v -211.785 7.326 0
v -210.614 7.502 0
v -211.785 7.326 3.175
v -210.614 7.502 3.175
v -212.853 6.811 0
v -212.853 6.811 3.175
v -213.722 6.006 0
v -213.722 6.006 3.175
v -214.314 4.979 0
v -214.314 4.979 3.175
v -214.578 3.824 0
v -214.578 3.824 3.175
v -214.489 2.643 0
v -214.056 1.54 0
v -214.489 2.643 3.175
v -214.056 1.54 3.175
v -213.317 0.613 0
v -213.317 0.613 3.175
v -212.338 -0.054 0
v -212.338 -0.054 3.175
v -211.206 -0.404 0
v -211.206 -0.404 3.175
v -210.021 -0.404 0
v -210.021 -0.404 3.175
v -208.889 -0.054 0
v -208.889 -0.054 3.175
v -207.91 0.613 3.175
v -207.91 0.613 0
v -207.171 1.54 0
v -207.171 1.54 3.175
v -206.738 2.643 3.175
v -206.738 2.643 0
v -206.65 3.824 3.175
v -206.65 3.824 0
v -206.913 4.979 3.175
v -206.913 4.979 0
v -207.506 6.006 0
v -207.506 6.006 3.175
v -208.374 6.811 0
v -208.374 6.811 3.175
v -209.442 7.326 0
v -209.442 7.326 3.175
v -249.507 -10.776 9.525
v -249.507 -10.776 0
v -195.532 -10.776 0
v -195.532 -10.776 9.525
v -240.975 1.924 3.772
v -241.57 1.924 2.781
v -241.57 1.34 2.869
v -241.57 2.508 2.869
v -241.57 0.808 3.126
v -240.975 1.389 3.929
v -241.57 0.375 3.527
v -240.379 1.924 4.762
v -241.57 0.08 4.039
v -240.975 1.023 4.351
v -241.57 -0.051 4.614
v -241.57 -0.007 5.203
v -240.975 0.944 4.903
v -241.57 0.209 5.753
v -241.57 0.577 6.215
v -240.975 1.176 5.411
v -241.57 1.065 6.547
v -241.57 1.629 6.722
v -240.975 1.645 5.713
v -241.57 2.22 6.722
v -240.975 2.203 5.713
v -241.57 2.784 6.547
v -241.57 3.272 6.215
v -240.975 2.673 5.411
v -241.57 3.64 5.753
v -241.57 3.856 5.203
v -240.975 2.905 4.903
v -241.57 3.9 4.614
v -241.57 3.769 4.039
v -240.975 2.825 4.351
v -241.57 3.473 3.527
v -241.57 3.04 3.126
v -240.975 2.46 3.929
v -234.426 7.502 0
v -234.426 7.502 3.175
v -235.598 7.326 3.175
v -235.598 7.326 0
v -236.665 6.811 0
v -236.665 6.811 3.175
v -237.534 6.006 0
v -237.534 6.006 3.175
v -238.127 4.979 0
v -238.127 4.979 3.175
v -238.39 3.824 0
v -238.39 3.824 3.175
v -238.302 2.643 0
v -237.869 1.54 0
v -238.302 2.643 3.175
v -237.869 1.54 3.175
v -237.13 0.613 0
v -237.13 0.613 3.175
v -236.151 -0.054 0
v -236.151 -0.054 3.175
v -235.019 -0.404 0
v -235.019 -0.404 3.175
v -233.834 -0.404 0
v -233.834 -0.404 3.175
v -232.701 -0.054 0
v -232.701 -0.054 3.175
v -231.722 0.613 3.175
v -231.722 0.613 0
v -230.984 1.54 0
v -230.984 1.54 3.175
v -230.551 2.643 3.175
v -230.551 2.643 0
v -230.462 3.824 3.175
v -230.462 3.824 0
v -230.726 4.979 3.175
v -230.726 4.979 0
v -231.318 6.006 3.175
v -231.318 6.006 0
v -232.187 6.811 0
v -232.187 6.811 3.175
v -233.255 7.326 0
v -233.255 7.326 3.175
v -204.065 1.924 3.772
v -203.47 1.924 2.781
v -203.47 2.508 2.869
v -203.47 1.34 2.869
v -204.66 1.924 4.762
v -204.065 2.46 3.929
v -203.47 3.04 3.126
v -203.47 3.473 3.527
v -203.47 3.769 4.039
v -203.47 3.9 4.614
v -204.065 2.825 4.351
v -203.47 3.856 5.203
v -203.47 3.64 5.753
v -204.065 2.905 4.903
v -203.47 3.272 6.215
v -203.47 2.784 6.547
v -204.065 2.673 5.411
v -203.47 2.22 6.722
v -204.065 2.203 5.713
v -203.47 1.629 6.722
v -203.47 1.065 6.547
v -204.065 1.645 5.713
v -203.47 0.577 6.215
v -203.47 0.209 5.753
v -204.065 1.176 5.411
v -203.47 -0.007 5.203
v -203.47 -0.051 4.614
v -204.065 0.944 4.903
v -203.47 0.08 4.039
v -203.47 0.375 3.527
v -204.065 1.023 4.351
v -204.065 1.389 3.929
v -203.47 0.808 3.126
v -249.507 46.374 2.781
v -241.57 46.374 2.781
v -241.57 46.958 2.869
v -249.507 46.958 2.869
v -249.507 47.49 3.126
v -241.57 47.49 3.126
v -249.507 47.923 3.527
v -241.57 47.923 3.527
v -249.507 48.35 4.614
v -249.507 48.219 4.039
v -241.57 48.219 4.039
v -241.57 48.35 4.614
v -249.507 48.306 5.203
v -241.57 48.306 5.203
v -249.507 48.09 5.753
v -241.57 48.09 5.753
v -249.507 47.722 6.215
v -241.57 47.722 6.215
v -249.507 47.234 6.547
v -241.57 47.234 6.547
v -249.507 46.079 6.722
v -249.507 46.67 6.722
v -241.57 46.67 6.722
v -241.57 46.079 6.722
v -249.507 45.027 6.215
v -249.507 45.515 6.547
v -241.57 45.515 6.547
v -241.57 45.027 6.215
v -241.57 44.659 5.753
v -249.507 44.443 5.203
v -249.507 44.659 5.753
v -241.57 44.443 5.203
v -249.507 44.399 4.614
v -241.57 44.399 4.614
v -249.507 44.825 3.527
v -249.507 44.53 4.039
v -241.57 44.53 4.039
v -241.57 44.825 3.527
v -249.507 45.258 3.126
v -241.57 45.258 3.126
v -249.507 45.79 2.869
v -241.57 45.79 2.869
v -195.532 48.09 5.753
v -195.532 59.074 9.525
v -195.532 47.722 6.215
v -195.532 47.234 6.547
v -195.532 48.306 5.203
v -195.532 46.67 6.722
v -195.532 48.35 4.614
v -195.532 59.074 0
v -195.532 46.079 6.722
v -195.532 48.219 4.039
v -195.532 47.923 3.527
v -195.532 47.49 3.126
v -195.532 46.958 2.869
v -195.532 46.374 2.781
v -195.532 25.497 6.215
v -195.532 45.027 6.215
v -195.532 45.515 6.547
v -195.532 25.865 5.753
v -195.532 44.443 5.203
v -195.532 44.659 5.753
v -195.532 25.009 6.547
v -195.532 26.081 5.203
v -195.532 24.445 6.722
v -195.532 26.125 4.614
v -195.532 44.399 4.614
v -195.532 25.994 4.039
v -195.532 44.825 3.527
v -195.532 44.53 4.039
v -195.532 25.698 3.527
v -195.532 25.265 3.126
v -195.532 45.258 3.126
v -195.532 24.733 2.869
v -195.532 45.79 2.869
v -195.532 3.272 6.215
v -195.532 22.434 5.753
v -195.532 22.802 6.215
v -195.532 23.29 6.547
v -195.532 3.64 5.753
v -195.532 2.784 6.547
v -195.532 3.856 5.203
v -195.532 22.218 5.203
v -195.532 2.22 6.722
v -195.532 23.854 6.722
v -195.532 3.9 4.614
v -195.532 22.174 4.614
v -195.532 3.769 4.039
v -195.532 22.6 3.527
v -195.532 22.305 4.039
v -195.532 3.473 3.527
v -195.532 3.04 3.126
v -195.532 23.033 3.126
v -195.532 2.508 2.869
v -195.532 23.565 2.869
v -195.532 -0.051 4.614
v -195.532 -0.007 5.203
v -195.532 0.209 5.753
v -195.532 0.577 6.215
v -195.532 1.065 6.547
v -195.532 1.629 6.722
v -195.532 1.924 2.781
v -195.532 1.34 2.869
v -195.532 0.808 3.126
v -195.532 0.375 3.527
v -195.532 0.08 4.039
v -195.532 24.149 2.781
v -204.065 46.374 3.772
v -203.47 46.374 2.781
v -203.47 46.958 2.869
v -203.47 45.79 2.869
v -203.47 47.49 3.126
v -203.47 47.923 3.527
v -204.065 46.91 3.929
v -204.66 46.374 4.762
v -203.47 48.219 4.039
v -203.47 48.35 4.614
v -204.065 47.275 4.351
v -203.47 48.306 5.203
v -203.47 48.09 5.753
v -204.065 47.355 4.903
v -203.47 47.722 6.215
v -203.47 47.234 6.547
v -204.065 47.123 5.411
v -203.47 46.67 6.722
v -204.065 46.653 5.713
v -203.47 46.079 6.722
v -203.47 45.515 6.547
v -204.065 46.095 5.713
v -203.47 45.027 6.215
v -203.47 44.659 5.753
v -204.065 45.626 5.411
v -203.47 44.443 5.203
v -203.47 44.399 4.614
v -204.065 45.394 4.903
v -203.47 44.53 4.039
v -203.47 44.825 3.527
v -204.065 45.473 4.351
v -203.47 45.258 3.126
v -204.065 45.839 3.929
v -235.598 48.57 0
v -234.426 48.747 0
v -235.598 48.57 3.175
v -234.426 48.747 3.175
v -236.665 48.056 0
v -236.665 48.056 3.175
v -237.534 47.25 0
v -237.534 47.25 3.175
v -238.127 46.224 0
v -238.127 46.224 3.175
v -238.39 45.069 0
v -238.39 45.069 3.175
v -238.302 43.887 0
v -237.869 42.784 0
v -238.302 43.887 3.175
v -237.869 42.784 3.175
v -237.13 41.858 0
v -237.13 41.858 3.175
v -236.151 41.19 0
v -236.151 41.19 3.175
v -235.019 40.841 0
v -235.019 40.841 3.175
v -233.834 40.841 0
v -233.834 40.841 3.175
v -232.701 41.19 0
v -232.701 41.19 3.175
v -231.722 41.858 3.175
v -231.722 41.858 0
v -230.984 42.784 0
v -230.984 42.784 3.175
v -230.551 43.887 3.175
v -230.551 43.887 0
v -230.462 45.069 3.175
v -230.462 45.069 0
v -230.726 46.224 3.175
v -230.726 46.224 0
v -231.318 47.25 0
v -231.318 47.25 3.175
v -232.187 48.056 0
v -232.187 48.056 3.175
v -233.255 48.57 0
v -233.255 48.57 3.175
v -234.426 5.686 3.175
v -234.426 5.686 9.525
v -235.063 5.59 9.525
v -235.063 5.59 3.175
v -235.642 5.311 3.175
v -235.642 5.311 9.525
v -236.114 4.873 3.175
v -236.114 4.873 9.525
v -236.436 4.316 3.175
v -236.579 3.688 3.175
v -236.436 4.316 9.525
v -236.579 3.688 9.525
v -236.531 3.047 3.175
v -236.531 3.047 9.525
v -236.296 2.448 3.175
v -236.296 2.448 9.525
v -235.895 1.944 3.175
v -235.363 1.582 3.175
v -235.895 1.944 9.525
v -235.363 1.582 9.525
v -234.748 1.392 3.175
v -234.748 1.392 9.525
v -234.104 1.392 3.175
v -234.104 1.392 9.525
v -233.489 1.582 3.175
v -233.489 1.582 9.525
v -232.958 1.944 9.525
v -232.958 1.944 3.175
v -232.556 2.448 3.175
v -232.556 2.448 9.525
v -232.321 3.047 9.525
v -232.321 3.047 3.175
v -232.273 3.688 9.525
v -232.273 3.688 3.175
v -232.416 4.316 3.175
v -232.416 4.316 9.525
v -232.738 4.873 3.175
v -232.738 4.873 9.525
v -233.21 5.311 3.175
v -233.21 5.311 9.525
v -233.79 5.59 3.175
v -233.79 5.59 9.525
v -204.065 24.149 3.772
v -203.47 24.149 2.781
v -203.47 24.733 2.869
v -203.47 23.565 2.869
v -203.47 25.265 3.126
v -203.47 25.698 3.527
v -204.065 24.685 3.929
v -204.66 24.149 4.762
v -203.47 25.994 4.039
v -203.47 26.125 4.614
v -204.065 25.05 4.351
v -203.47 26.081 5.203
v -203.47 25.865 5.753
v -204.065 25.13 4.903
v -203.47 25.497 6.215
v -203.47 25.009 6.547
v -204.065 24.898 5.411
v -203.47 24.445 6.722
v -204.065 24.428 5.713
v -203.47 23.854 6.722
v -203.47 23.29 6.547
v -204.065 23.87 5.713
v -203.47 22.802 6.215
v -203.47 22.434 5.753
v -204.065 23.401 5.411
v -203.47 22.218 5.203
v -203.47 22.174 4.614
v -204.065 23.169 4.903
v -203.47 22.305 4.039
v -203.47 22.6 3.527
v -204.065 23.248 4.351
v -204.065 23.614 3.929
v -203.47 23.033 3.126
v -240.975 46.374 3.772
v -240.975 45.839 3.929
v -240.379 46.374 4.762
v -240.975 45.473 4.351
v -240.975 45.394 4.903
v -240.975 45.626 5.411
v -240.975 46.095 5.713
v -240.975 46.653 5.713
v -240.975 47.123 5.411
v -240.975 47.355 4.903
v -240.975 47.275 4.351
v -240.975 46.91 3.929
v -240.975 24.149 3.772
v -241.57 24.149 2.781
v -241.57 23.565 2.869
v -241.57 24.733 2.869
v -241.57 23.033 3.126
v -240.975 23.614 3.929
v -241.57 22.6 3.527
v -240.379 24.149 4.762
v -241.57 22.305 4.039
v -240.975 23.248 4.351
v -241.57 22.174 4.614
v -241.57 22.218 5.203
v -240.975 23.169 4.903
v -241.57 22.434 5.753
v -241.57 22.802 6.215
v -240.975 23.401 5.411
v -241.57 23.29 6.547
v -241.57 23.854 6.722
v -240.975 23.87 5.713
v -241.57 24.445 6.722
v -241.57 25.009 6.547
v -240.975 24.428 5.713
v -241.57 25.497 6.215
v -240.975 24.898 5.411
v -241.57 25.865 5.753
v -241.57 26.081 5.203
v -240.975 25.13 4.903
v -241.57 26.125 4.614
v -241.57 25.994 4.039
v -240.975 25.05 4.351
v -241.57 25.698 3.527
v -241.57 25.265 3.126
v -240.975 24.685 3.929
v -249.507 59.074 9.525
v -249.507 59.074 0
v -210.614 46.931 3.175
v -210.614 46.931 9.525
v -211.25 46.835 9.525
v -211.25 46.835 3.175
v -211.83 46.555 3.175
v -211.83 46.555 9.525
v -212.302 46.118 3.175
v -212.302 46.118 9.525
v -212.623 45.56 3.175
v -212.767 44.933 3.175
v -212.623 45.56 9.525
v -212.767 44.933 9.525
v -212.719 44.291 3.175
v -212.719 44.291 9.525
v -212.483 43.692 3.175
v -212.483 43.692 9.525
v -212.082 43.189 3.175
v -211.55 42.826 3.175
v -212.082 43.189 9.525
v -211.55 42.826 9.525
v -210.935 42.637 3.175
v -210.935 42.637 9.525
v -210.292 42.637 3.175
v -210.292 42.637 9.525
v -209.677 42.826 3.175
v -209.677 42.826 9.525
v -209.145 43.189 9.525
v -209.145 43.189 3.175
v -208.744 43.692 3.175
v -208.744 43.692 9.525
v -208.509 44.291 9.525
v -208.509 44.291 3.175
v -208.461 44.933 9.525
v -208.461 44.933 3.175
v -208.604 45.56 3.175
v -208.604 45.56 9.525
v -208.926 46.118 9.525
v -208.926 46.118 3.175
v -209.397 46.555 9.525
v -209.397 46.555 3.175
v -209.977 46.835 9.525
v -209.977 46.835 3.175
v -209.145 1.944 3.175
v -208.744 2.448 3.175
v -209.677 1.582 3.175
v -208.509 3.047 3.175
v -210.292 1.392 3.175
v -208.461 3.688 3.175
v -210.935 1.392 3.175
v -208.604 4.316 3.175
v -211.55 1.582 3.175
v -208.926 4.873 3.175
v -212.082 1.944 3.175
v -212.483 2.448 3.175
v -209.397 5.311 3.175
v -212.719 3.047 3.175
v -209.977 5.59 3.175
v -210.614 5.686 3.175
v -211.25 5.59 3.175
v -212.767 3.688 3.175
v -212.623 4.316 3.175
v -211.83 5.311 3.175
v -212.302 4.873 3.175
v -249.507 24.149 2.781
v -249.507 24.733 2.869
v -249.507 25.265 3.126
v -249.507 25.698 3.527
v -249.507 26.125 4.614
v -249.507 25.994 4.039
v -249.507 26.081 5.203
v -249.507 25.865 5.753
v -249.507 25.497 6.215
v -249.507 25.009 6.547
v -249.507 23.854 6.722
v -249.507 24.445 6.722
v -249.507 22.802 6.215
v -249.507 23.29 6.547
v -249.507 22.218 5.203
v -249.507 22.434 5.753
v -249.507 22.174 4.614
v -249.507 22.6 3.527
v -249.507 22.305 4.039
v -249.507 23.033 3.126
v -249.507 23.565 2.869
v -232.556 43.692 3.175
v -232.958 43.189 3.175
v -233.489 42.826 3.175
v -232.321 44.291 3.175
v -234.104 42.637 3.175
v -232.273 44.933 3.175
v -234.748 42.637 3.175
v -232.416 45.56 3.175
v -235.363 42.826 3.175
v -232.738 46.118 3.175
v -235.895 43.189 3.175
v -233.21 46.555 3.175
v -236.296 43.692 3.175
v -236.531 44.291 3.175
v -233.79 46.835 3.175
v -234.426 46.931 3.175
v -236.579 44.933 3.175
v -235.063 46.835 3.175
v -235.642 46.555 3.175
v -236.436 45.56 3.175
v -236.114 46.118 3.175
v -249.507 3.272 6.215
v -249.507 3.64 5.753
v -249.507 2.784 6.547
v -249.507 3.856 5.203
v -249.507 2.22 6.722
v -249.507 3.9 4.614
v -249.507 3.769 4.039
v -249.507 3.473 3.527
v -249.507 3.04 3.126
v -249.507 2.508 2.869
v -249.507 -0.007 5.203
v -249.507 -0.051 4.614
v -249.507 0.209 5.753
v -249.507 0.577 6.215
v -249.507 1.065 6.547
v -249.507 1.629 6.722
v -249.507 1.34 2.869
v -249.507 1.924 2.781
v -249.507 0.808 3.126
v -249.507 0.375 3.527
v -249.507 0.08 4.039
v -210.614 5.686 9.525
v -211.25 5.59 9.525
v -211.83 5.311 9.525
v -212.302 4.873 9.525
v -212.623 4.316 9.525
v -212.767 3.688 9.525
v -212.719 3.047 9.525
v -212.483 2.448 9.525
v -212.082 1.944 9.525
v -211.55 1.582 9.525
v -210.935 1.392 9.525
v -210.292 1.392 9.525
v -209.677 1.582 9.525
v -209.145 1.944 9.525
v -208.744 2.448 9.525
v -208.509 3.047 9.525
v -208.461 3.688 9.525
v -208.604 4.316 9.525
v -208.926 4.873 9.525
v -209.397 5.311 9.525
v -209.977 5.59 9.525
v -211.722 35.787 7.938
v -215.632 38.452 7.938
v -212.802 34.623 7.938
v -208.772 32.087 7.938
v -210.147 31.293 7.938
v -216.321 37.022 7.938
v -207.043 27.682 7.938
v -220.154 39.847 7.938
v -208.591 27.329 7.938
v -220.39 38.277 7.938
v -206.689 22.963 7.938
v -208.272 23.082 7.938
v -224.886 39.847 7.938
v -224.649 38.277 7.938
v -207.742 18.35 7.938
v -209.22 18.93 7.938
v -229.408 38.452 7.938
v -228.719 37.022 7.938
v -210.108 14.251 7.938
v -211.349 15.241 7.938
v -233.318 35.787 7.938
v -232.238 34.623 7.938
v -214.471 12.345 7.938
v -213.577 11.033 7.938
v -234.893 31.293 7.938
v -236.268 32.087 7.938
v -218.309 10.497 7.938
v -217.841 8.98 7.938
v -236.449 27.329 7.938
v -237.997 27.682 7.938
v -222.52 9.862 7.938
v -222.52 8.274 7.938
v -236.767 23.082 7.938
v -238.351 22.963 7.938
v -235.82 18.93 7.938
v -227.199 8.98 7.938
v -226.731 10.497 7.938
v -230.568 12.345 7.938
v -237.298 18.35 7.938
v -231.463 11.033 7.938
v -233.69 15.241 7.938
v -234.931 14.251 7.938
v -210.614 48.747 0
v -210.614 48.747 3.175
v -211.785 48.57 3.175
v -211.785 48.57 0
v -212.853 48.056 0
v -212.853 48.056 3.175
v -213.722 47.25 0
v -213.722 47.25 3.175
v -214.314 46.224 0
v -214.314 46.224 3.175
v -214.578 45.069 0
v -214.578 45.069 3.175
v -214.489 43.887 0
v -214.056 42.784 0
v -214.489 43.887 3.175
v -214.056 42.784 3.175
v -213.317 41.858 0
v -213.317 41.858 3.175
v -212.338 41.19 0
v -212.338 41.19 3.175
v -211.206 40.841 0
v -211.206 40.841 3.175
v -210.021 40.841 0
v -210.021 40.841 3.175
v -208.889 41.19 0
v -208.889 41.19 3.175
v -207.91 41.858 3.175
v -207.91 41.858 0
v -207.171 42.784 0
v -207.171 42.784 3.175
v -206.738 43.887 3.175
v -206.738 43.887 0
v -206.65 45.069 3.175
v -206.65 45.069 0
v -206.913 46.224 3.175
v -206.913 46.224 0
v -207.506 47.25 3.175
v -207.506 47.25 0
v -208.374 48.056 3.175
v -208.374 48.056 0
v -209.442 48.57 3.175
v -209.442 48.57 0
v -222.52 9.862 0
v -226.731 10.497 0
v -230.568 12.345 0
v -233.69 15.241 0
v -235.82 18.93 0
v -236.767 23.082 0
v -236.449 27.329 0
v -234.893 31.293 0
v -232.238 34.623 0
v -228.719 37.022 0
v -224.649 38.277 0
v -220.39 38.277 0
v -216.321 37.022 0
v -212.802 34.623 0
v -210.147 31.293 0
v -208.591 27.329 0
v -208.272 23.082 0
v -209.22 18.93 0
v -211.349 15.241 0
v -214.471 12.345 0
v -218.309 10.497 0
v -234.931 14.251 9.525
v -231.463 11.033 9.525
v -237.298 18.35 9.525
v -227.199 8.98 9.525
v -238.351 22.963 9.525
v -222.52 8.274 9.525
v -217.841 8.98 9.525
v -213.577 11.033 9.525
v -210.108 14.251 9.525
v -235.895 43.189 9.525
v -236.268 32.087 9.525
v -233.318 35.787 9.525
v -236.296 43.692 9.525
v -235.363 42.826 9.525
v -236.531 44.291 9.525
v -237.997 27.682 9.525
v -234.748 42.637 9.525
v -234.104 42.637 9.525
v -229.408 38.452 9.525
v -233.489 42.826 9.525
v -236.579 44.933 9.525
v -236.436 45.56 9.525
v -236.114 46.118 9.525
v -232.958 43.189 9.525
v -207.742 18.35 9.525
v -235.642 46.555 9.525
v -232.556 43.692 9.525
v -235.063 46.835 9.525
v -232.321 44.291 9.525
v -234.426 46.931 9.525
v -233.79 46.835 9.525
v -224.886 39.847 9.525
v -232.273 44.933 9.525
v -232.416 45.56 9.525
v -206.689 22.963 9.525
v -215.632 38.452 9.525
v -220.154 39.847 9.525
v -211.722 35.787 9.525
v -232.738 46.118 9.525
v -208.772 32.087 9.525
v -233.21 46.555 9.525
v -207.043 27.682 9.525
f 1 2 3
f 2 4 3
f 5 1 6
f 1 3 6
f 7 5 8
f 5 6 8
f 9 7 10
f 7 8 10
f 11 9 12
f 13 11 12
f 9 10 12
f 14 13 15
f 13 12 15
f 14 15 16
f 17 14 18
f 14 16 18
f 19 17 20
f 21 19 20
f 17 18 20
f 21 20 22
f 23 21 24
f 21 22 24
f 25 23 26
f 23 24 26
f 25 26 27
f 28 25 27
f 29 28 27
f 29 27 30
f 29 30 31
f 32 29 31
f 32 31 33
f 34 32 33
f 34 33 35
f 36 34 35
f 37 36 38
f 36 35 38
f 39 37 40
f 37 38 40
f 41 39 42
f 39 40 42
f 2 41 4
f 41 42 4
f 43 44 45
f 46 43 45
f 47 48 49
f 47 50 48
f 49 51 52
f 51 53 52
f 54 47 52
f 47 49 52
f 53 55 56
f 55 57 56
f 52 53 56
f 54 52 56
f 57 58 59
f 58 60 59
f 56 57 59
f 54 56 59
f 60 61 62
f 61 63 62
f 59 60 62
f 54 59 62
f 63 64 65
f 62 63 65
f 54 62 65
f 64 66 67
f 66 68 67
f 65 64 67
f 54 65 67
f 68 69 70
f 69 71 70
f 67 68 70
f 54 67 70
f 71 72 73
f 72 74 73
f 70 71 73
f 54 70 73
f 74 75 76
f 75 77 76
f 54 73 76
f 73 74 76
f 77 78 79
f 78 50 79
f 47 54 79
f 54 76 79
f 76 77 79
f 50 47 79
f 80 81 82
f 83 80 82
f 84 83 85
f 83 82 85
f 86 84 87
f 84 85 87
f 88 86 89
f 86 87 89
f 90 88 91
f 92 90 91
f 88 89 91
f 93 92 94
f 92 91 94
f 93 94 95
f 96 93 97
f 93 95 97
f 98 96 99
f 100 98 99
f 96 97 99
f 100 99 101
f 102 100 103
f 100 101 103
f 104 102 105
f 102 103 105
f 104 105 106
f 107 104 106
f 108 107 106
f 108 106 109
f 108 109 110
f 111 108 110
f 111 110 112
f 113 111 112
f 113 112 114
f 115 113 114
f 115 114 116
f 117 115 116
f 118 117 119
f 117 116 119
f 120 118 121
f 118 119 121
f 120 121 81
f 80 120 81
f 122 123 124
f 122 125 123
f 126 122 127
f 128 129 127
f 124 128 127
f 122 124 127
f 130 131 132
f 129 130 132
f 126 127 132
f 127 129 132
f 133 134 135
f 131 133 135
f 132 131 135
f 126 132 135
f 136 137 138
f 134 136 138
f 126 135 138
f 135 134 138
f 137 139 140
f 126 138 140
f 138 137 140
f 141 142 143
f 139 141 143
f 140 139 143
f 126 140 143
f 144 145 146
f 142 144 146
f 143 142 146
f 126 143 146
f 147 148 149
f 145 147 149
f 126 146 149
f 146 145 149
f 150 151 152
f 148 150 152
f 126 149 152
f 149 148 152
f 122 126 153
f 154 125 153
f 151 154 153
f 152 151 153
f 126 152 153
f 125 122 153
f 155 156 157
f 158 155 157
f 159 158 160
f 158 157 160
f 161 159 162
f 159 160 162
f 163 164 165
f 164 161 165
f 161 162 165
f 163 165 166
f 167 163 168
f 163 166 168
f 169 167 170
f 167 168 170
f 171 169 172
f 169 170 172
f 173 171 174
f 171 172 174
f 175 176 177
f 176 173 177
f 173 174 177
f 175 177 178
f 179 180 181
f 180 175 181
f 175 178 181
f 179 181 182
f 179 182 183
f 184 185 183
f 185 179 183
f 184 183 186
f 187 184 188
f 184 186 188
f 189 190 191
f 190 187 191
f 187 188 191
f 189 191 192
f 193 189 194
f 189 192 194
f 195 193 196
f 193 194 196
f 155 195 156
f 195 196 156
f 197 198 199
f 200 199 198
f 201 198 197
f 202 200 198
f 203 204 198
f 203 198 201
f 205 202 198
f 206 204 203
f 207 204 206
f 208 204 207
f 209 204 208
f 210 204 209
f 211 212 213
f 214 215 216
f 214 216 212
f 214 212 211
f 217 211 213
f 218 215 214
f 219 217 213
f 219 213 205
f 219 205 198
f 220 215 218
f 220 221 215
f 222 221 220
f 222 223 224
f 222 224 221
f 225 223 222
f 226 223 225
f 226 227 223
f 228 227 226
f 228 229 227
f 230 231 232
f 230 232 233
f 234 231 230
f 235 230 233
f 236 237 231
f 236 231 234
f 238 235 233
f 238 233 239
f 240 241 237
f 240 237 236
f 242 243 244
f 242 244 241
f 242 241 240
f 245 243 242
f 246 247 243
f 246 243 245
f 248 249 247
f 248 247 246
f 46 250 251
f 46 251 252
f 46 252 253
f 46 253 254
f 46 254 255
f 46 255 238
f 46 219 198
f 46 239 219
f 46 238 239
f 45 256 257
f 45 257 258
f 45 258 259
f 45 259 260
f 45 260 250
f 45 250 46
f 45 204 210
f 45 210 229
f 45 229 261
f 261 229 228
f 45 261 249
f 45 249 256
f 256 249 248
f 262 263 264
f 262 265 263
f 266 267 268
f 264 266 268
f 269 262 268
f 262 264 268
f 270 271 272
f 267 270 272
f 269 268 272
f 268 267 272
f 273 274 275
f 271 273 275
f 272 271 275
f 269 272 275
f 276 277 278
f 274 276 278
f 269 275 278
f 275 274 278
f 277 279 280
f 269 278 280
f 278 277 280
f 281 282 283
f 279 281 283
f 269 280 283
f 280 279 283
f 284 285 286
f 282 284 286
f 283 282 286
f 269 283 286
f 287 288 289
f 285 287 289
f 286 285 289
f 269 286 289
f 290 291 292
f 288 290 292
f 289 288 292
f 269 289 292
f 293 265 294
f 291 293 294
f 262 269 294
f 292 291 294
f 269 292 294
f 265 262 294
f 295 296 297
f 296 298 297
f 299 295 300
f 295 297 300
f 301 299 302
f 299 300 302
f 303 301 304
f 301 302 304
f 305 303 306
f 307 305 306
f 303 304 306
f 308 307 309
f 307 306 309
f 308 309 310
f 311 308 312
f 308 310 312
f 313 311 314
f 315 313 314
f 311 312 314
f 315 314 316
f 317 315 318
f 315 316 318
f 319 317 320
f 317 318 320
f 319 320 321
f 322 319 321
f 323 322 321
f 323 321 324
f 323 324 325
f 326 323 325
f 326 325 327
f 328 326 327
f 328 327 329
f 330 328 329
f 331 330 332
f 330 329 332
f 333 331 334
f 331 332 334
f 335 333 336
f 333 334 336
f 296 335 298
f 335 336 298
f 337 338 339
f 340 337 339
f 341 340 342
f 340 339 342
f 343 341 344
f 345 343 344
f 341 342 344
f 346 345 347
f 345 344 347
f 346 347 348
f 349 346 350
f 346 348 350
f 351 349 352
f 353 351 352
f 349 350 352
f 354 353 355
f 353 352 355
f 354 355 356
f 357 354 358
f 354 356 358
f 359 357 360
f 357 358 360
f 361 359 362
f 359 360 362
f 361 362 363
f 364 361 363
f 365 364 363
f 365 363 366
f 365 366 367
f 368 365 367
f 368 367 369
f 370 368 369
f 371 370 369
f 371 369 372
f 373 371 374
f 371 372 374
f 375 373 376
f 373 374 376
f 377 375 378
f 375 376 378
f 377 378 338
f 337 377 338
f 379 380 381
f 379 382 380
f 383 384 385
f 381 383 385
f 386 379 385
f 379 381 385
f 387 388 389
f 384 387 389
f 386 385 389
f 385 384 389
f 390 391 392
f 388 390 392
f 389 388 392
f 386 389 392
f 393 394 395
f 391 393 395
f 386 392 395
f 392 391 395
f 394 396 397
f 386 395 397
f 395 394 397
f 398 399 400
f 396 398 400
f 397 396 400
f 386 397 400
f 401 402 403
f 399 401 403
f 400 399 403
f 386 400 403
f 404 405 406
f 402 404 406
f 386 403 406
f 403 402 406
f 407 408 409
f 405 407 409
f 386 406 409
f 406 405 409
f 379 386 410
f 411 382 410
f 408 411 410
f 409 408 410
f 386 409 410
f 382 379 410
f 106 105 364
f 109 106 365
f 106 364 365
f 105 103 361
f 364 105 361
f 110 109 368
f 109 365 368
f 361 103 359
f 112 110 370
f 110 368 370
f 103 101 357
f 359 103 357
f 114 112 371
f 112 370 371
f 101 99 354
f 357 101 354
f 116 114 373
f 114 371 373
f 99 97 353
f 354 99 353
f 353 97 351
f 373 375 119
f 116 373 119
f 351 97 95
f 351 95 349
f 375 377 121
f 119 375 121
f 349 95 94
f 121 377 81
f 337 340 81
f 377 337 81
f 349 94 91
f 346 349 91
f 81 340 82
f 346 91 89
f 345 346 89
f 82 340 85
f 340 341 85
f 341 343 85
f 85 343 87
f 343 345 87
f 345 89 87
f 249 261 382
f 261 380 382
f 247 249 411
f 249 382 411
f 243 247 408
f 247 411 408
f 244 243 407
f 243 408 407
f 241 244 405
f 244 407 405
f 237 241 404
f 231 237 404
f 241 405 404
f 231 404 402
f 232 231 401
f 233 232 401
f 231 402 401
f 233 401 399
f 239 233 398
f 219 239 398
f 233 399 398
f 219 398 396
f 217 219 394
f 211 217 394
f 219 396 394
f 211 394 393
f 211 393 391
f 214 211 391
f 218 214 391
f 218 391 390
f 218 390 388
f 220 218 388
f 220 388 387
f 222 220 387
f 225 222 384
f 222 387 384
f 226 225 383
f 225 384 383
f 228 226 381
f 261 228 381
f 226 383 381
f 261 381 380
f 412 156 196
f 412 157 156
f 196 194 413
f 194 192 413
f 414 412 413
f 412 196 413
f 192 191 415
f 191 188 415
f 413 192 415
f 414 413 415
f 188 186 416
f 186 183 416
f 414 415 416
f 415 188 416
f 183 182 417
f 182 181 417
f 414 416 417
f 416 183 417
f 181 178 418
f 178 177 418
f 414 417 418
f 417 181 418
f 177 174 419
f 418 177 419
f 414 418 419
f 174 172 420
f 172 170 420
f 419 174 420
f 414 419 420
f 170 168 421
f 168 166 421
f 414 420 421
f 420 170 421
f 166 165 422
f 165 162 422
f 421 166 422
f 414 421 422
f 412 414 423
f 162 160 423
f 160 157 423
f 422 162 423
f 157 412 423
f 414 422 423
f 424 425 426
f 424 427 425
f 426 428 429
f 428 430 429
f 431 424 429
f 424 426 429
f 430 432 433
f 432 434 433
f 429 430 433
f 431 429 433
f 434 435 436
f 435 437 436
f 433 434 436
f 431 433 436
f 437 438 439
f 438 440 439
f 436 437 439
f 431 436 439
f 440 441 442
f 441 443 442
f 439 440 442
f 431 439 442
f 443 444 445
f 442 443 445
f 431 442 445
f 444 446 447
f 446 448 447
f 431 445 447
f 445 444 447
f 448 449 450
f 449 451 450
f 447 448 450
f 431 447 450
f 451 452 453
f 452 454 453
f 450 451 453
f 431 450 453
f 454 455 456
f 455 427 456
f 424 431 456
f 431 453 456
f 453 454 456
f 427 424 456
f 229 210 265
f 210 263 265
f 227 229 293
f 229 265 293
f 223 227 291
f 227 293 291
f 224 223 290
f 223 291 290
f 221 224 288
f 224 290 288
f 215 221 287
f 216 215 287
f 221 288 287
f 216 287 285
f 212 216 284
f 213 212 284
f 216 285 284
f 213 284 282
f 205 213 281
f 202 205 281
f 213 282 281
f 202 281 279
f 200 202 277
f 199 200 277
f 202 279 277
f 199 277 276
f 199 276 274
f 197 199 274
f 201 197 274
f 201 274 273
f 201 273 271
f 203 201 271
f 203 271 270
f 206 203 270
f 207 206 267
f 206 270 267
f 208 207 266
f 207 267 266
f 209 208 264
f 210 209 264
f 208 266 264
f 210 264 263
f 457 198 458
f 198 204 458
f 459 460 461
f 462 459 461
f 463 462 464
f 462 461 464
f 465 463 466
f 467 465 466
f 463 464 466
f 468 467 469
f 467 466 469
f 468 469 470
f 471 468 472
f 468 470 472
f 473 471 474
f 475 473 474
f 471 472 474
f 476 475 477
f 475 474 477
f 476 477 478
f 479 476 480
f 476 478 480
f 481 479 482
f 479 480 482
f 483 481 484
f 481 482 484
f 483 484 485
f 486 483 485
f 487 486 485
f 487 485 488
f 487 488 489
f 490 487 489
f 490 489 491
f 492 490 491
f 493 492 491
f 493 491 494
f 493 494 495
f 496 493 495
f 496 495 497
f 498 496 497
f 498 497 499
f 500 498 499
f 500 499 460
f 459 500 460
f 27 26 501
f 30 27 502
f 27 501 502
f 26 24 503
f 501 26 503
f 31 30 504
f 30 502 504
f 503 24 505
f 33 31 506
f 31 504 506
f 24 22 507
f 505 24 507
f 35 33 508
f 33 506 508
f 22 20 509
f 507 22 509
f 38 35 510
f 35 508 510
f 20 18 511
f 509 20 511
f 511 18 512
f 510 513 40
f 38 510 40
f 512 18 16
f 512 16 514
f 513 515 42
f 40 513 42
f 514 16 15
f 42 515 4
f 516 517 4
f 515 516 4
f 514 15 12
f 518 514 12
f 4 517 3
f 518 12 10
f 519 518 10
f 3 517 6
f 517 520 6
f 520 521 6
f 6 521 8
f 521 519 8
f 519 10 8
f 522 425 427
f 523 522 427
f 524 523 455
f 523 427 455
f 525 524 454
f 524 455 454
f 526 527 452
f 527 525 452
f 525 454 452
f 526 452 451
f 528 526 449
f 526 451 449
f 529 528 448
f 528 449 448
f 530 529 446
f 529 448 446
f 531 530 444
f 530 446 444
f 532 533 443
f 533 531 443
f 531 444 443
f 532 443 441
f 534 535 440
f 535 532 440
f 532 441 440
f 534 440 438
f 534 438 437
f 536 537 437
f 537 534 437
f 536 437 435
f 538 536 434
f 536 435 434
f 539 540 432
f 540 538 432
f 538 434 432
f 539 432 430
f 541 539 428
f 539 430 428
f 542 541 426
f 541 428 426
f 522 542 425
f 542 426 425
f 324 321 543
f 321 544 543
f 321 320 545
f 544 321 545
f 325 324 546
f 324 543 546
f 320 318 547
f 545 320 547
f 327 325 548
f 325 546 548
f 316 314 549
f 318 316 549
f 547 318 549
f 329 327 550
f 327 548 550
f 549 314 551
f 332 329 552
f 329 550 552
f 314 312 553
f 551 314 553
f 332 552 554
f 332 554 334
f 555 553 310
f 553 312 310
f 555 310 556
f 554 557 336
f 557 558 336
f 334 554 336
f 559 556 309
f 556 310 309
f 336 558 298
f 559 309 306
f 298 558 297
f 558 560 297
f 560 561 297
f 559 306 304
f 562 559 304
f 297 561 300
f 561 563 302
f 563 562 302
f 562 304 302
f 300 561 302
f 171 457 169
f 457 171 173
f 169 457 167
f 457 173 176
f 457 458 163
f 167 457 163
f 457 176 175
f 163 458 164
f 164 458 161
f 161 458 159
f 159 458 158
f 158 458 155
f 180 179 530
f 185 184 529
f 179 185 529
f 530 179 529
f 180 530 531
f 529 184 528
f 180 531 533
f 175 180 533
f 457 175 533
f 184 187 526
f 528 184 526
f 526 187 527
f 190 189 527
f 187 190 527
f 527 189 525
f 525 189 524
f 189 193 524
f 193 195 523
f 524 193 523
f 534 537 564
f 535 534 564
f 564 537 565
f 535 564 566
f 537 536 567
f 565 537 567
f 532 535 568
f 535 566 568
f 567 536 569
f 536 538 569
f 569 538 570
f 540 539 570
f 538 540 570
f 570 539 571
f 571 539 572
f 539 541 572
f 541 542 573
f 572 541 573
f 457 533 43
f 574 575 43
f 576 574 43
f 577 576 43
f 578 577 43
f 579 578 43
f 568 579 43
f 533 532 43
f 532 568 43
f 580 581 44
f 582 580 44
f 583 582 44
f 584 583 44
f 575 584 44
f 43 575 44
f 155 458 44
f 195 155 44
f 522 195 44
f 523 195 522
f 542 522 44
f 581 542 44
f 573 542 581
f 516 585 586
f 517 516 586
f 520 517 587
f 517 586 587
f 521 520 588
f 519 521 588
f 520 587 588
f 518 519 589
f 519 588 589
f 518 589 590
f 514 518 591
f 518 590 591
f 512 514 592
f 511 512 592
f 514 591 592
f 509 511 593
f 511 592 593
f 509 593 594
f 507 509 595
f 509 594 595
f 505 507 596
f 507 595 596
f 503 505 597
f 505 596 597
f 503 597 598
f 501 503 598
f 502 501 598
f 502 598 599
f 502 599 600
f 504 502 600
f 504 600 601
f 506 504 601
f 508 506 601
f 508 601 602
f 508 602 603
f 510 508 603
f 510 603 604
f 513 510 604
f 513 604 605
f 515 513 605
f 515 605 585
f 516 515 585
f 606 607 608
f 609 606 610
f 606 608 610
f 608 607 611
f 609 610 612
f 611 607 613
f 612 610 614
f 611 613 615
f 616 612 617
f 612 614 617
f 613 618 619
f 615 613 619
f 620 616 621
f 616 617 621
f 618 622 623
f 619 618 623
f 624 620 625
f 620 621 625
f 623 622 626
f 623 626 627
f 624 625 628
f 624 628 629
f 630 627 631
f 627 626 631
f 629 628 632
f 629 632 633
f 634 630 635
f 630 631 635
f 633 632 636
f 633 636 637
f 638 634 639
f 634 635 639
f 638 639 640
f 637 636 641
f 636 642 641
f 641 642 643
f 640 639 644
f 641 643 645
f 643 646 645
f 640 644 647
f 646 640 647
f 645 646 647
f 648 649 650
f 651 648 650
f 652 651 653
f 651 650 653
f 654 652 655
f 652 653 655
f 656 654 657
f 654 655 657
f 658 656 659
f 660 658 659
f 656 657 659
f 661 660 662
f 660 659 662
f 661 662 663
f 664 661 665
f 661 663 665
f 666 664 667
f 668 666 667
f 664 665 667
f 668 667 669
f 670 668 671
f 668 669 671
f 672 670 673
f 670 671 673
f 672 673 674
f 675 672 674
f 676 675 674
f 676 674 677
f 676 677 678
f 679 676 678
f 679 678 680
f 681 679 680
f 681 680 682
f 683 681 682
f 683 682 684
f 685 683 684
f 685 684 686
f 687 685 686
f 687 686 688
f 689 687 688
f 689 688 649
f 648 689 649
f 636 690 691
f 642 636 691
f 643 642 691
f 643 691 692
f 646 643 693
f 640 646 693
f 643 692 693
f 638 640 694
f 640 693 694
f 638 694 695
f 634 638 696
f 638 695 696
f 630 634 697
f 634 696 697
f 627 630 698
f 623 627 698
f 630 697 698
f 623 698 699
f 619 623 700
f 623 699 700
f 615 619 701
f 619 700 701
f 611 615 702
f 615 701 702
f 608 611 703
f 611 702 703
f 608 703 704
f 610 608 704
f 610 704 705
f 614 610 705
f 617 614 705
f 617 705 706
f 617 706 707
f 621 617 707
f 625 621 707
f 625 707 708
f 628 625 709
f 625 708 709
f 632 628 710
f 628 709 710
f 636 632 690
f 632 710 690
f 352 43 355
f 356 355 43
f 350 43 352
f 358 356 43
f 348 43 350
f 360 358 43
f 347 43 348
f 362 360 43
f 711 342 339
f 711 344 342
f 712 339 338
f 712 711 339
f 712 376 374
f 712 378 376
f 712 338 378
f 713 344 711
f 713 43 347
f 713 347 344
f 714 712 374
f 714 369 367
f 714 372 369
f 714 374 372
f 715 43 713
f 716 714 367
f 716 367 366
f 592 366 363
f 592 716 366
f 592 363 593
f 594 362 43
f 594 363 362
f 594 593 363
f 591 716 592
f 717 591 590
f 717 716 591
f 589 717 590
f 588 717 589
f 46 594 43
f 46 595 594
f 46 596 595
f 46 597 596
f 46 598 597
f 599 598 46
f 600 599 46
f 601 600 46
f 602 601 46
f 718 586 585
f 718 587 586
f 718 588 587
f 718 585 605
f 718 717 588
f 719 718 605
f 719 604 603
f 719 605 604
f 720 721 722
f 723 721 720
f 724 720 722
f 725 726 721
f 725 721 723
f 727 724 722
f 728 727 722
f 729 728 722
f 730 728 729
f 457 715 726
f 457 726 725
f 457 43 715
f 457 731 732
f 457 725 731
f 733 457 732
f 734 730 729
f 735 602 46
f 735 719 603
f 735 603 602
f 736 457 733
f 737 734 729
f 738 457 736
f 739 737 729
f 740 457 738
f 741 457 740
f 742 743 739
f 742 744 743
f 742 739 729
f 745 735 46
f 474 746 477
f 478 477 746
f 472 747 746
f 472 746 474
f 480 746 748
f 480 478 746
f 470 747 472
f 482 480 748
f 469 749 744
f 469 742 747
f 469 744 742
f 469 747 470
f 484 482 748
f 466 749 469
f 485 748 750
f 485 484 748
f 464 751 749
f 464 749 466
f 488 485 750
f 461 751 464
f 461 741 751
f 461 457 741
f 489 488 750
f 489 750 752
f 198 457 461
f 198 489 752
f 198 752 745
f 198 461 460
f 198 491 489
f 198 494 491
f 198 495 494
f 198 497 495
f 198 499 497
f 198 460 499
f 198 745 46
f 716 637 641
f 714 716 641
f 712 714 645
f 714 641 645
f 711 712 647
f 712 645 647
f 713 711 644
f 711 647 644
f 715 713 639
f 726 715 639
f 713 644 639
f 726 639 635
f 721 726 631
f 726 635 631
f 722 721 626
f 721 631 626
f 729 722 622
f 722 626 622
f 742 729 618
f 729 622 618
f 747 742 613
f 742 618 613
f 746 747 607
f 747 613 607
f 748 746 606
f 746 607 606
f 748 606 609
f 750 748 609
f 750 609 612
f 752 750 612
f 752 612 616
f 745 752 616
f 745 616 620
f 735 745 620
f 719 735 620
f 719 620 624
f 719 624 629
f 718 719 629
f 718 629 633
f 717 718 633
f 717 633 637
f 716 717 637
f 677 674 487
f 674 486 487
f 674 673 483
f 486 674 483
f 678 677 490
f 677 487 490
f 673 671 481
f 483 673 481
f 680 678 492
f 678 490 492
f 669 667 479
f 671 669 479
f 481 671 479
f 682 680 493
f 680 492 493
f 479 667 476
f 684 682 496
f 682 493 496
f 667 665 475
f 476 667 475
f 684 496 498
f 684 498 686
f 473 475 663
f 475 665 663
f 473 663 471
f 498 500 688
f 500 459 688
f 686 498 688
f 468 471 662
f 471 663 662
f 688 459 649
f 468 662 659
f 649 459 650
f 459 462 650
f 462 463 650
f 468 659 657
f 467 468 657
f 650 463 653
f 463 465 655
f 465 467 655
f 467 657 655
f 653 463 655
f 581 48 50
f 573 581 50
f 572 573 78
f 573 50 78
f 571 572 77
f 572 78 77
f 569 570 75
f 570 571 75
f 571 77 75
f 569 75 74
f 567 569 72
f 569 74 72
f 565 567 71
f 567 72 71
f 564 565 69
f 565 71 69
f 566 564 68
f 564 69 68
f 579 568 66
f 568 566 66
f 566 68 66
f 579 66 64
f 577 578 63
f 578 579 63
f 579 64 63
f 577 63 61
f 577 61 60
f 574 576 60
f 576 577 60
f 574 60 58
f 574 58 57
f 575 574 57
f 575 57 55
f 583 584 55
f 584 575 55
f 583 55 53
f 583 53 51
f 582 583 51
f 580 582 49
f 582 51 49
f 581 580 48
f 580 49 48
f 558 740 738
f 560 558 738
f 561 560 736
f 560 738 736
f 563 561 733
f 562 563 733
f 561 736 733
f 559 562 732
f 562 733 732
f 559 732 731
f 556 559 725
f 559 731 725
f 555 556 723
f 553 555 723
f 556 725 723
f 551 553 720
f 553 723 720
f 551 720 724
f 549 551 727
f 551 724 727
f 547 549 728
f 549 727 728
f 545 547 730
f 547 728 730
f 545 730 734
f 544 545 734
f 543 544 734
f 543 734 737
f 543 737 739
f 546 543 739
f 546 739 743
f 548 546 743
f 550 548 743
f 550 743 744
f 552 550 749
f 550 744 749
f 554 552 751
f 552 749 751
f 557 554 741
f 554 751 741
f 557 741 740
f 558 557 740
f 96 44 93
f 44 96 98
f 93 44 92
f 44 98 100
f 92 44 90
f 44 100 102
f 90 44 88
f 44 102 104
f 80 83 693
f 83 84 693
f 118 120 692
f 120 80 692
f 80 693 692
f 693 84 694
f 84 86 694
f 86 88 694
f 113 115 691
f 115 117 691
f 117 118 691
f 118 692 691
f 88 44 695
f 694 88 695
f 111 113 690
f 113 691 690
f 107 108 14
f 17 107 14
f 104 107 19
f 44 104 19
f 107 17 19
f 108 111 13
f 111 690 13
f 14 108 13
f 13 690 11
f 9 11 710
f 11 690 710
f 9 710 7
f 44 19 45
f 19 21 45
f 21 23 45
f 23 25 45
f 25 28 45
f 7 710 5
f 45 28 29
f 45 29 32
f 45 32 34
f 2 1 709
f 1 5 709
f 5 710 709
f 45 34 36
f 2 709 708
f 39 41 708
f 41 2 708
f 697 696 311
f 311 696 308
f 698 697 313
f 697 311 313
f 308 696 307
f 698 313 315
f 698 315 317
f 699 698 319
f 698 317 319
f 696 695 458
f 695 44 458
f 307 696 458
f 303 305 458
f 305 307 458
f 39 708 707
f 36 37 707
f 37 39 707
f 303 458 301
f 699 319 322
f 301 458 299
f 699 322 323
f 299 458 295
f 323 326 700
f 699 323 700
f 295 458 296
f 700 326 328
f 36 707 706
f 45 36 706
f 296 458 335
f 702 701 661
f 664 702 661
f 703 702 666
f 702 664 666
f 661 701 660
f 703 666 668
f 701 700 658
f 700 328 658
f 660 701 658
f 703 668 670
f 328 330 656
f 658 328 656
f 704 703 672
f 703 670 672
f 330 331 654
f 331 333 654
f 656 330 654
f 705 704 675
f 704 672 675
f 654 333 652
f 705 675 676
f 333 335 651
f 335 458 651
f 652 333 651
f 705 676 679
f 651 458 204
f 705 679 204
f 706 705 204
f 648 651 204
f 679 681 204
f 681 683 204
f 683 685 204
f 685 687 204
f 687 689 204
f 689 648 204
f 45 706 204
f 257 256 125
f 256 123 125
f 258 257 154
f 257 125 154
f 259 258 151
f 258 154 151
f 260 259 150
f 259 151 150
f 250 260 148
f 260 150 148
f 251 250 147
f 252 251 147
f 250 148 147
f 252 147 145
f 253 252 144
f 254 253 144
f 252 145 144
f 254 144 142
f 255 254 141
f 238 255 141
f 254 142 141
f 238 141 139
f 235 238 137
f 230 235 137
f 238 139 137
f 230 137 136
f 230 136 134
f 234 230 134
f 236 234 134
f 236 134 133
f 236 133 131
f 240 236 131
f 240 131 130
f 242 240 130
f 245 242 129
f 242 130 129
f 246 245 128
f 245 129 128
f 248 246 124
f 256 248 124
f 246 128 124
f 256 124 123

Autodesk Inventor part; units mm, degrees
ref_plane "YZ Plane" through (0, 0, 0) normal (1, 0, 0) x (0, 1, 0)
ref_plane "XZ Plane" through (0, 0, 0) normal (0, 1, 0) x (-1, 0, 0)
sketch "Sketch1" plane through (0, 0, 0) normal (0, 0, 1) x (1, 0, 0)
  circle A0 centre (0, 0) radius 38.1 construction
  circle A1 centre (0, 0) radius 41.275 construction
  line L0 (-7.3323, 0) -> (-3.6662, 6.35) construction
  line L1 (-3.6662, 6.35) -> (3.6662, 6.35) construction
  line L2 (3.6662, 6.35) -> (7.3323, 0) construction
  line L3 (7.3323, 0) -> (3.6662, -6.35) construction
  line L4 (3.6662, -6.35) -> (-3.6662, -6.35) construction
  line L5 (-3.6662, -6.35) -> (-7.3323, 0) construction
  circle A2 centre (0, 0) radius 14.2875 construction
  circle A3 centre (0, 0) radius 15.875 construction
  circle A4 centre (0, 0) radius 8.7313 construction
  circle A5 centre (0, 0) radius 22.225 construction
  line L6 (34.925, 38.1) -> (34.925, 95.25) construction
  line L7 (34.925, 95.25) -> (-34.925, 95.25) construction
  line L8 (-34.925, 95.25) -> (-34.925, 38.1) construction
  line L9 (34.925, 38.1) -> (-34.925, 38.1) construction
  line L10 (34.925, 38.1) -> (21.2491, -6.5137) construction
  line L11 (-34.925, 38.1) -> (-21.2491, -6.5137) construction
  circle A6 centre (-30.353, 38.1) radius 3.9624 construction
  line L12 (53.34, 95.25) -> (-53.34, 95.25) construction
  line L13 (-53.34, 95.25) -> (-53.34, 104.775) construction
  line L14 (-53.34, 104.775) -> (53.34, 104.775) construction
  line L15 (53.34, 104.775) -> (53.34, 95.25) construction
  circle A7 centre (-222.5199, 24.1494) radius 53.34 construction
  line L16 (-190.7699, 59.0744) -> (-254.2699, 59.0744)
  line L17 (-254.2699, 59.0744) -> (-254.2699, -10.7756)
  line L18 (-254.2699, -10.7756) -> (-190.7699, -10.7756)
  line L19 (-190.7699, -10.7756) -> (-190.7699, 59.0744)
  line L20 (-195.5324, 59.0744) -> (-195.5324, -10.7756)
  line L21 (-249.5074, 59.0744) -> (-249.5074, -10.7756)
  line L22 (-209.8199, 68.5994) -> (-235.2199, 68.5994) construction
  line L23 (-235.2199, 68.5994) -> (-235.2199, -20.3006) construction
  line L24 (-235.2199, -20.3006) -> (-209.8199, -20.3006) construction
  line L25 (-209.8199, -20.3006) -> (-209.8199, 68.5994) construction
  line L26 (34.925, 88.9) -> (-34.925, 88.9) construction
  circle A8 centre (30.353, 38.1) radius 3.9624 construction
  circle A9 centre (30.353, 76.2) radius 3.9624 construction
  circle A10 centre (-30.353, 76.2) radius 3.9624 construction
  circle A11 centre (0, 47.625) radius 3.9624 construction
  line L27 (34.925, 92.075) -> (-34.925, 92.075) construction
  circle A12 centre (0, 71.755) radius 14.2875 construction
  circle A13 centre (0, 71.755) radius 15.875 construction
  line L28 (7.3323, 71.755) -> (3.6662, 65.405) construction
  line L29 (3.6662, 65.405) -> (-3.6662, 65.405) construction
  line L30 (-3.6662, 65.405) -> (-7.3323, 71.755) construction
  line L31 (-7.3323, 71.755) -> (-3.6662, 78.105) construction
  line L32 (-3.6662, 78.105) -> (3.6662, 78.105) construction
  line L33 (3.6662, 78.105) -> (7.3323, 71.755) construction
  point P0 (22.225, 92.075)
  point P1 (0, 92.075)
  point P2 (-22.225, 92.075)
  point P3 (0, 47.625)
  dimension "d0" = 76.2
  dimension "d2" = 82.55
  dimension "d3" = 12.7
  dimension "d4" = 28.575
  dimension "d5" = 31.75
  dimension "d6" = 17.4625
  dimension "d7" = 44.45
  dimension "d8" = 69.85
  dimension "d9" = 34.925
  dimension "d10" = 38.1
  dimension "d11" = 57.15
  dimension "d13" = 7.9248
  dimension "d14" = 9.525
  dimension "d15" = 106.68
  dimension "d16" = 53.34
  dimension "d17" = 106.68
  dimension "d18" = 69.85
  dimension "d19" = 34.925
  dimension "d20" = 63.5
  dimension "d21" = 31.75
  dimension "d22" = 4.7625
  dimension "d23" = 4.7625
  dimension "d24" = 25.4
  dimension "d25" = 14.2875
  dimension "d26" = 88.9
  dimension "d27" = 14.2875
  dimension "d28" = 44.45
  dimension "d29" = 4.572
  dimension "d30" = 6.35
  dimension "d31" = 0
  dimension "d32" = 7.9248
  dimension "d33" = 4.572
  dimension "d34" = 7.9248
  dimension "d35" = 7.9248
  dimension "d36" = 4.572
  dimension "d37" = 4.572
  dimension "d38" = 38.1
  dimension "d39" = 38.1
  dimension "d40" = 7.9248
  dimension "d41" = 9.525
  dimension "d42" = 34.925
  dimension "d44" = 3.175
  dimension "d45" = 34.925
  dimension "d46" = 12.7
  dimension "d47" = 12.7
  dimension "d48" = 28.575
  dimension "d50" = 0
  dimension "d52" = 31.75
  dimension "d53" = 12.7
  dimension "d54" = 17.145
extrude "Plate1" add sketch "Sketch1" along normal blind 9.525 contours L20 L18 L21 L16
sketch "Sketch3" plane through (0, 0, 0) normal (0, 0, -1) x (-1, 0, 0)
  line L0 (249.5074, -10.7756) -> (195.5324, -10.7756) projected
  line L1 (249.5074, 59.0744) -> (249.5074, -10.7756) projected
  circle A0 centre (222.5199, 24.1494) radius 23.8125 construction
  line L2 (210.6137, 44.7716) -> (222.5199, 24.1494) construction
  line L3 (222.5199, 24.1494) -> (198.7074, 24.1494) construction
  point P0 (195.5324, 59.0744)
  point P1 (0, 0)
  point P2 (198.7074, 24.1494)
  point P3 (210.6137, 3.5271)
  point P4 (234.4262, 3.5271)
  point P5 (246.3324, 24.1494)
  point P6 (234.4262, 44.7716)
  dimension "d69" = 47.625
  dimension "d71" = 26.9875
  dimension "d72" = 53.975
  dimension "d73" = 34.925
  dimension "d74" = 69.85
  dimension "d75" = 60
  dimension "d78" = 360
hole "Hole2" at (-210.6137, 44.7716, 0) at (-210.6137, 3.5271, 0) at (-234.4262, 3.5271, 0) at (-234.4262, 44.7716, 0) direction (0, 0, 1) diameter 4.318 end through all counterbore diameter 7.9502 counterbore depth 3.175 clearance for "Socket Head Cap Screw" size "#8" standard "Ansi Unified Screw Threads"
sketch "Sketch4" plane through (0, 0, 9.525) normal (0, 0, 1) x (1, 0, 0)
  line L0 (-249.5074, -10.7756) -> (-249.5074, 59.0744) projected
  line L1 (-195.5324, -10.7756) -> (-249.5074, -10.7756) projected
  point P0 (0, 0)
  point P1 (-222.5199, 24.1494)
  dimension "d97" = 53.975
  dimension "d98" = 69.85
  dimension "d99" = 34.925
  dimension "d100" = 26.9875
hole "Hole4" at (-222.5199, 24.1494, 9.525) direction (0, 0, -1) diameter 28.575 end through all counterbore diameter 31.75 counterbore depth 1.5875
ref_plane "Work Plane1" through (-222.5199, -10.7756, 0) normal (1, 0, 0) x (0, 0, -1)
sketch "Sketch2" plane through (-195.5324, -10.7756, 0) normal (1, 0, 0) x (0, 0, -1)
  line L0 (0, 0) -> (-9.525, 0) projected
  line L1 (0, 69.85) -> (-9.525, 69.85) projected
  line L2 (-4.7625, 69.85) -> (-4.7625, 0) construction
  point P0 (0, 10.7756)
  point P1 (-4.7625, 57.15)
  point P2 (-4.7625, 34.925)
  point P3 (-4.7625, 12.7)
  dimension "d87" = 12.7
  dimension "d88" = 12.7
  dimension "d89" = 34.925
hole "Hole1" at (-195.5324, 46.3744, 4.7625) at (-195.5324, 24.1494, 4.7625) at (-195.5324, 1.9244, 4.7625) direction (-1, 0, 0) diameter 3.9624 depth 7.9375 tip angle 118 thread size "10-32 UNF" class "2B" standard "ANSI Unified Screw Threads"
mirror "Mirror1" about plane through (-222.5199, -10.7756, 0) normal (1, 0, 0) of "Hole1"
equation "\"d99\" = 0.5 * d98"
equation "\"d100\" = 0.5 * d97"
equation "\"d9\" = 0.5 * d8"
equation "\"d16\" = 0.5 * d15"
equation "\"d19\" = 0.5 * d18"
equation "\"d21\" = 0.5 * d20"
equation "\"d22\" = d23"
equation "\"d25\" = d27"
equation "\"d28\" = 0.5 * d26"
equation "\"d32\" = d13"
equation "\"d33\" = d29"
equation "\"d34\" = d32"
equation "\"d35\" = d13"
equation "\"d36\" = d29"
equation "\"d37\" = d29"
equation "\"d39\" = d38"
equation "\"d40\" = d13"
equation "\"d44\" = 0.5 * d30"
equation "\"d71\" = 0.5 * d72"
equation "\"d73\" = 0.5 * d74"
equation "\"d106\" = Thickness"
equation "\"d45\" = d42"
equation "\"d47\" = d46"
equation "\"BendRadius\" = Thickness"
equation "\"BendReliefWidth\" = Thickness"
equation "\"BendReliefDepth\" = 0.5 * Thickness"
equation "\"CornerReliefSize\" = 4 * Thickness"
equation "\"MinimumRemnant\" = 2 * Thickness"
equation "\"TransitionRadius\" = BendRadius"
equation "\"JacobiRadiusSize\" = Thickness"
equation "\"GapSize\" = Thickness"
equation "\"d55\" = BendRadius"
equation "\"Thickness\" = 9.525"
properties part number "Swerve Wheel + Carriage Outline V1"
